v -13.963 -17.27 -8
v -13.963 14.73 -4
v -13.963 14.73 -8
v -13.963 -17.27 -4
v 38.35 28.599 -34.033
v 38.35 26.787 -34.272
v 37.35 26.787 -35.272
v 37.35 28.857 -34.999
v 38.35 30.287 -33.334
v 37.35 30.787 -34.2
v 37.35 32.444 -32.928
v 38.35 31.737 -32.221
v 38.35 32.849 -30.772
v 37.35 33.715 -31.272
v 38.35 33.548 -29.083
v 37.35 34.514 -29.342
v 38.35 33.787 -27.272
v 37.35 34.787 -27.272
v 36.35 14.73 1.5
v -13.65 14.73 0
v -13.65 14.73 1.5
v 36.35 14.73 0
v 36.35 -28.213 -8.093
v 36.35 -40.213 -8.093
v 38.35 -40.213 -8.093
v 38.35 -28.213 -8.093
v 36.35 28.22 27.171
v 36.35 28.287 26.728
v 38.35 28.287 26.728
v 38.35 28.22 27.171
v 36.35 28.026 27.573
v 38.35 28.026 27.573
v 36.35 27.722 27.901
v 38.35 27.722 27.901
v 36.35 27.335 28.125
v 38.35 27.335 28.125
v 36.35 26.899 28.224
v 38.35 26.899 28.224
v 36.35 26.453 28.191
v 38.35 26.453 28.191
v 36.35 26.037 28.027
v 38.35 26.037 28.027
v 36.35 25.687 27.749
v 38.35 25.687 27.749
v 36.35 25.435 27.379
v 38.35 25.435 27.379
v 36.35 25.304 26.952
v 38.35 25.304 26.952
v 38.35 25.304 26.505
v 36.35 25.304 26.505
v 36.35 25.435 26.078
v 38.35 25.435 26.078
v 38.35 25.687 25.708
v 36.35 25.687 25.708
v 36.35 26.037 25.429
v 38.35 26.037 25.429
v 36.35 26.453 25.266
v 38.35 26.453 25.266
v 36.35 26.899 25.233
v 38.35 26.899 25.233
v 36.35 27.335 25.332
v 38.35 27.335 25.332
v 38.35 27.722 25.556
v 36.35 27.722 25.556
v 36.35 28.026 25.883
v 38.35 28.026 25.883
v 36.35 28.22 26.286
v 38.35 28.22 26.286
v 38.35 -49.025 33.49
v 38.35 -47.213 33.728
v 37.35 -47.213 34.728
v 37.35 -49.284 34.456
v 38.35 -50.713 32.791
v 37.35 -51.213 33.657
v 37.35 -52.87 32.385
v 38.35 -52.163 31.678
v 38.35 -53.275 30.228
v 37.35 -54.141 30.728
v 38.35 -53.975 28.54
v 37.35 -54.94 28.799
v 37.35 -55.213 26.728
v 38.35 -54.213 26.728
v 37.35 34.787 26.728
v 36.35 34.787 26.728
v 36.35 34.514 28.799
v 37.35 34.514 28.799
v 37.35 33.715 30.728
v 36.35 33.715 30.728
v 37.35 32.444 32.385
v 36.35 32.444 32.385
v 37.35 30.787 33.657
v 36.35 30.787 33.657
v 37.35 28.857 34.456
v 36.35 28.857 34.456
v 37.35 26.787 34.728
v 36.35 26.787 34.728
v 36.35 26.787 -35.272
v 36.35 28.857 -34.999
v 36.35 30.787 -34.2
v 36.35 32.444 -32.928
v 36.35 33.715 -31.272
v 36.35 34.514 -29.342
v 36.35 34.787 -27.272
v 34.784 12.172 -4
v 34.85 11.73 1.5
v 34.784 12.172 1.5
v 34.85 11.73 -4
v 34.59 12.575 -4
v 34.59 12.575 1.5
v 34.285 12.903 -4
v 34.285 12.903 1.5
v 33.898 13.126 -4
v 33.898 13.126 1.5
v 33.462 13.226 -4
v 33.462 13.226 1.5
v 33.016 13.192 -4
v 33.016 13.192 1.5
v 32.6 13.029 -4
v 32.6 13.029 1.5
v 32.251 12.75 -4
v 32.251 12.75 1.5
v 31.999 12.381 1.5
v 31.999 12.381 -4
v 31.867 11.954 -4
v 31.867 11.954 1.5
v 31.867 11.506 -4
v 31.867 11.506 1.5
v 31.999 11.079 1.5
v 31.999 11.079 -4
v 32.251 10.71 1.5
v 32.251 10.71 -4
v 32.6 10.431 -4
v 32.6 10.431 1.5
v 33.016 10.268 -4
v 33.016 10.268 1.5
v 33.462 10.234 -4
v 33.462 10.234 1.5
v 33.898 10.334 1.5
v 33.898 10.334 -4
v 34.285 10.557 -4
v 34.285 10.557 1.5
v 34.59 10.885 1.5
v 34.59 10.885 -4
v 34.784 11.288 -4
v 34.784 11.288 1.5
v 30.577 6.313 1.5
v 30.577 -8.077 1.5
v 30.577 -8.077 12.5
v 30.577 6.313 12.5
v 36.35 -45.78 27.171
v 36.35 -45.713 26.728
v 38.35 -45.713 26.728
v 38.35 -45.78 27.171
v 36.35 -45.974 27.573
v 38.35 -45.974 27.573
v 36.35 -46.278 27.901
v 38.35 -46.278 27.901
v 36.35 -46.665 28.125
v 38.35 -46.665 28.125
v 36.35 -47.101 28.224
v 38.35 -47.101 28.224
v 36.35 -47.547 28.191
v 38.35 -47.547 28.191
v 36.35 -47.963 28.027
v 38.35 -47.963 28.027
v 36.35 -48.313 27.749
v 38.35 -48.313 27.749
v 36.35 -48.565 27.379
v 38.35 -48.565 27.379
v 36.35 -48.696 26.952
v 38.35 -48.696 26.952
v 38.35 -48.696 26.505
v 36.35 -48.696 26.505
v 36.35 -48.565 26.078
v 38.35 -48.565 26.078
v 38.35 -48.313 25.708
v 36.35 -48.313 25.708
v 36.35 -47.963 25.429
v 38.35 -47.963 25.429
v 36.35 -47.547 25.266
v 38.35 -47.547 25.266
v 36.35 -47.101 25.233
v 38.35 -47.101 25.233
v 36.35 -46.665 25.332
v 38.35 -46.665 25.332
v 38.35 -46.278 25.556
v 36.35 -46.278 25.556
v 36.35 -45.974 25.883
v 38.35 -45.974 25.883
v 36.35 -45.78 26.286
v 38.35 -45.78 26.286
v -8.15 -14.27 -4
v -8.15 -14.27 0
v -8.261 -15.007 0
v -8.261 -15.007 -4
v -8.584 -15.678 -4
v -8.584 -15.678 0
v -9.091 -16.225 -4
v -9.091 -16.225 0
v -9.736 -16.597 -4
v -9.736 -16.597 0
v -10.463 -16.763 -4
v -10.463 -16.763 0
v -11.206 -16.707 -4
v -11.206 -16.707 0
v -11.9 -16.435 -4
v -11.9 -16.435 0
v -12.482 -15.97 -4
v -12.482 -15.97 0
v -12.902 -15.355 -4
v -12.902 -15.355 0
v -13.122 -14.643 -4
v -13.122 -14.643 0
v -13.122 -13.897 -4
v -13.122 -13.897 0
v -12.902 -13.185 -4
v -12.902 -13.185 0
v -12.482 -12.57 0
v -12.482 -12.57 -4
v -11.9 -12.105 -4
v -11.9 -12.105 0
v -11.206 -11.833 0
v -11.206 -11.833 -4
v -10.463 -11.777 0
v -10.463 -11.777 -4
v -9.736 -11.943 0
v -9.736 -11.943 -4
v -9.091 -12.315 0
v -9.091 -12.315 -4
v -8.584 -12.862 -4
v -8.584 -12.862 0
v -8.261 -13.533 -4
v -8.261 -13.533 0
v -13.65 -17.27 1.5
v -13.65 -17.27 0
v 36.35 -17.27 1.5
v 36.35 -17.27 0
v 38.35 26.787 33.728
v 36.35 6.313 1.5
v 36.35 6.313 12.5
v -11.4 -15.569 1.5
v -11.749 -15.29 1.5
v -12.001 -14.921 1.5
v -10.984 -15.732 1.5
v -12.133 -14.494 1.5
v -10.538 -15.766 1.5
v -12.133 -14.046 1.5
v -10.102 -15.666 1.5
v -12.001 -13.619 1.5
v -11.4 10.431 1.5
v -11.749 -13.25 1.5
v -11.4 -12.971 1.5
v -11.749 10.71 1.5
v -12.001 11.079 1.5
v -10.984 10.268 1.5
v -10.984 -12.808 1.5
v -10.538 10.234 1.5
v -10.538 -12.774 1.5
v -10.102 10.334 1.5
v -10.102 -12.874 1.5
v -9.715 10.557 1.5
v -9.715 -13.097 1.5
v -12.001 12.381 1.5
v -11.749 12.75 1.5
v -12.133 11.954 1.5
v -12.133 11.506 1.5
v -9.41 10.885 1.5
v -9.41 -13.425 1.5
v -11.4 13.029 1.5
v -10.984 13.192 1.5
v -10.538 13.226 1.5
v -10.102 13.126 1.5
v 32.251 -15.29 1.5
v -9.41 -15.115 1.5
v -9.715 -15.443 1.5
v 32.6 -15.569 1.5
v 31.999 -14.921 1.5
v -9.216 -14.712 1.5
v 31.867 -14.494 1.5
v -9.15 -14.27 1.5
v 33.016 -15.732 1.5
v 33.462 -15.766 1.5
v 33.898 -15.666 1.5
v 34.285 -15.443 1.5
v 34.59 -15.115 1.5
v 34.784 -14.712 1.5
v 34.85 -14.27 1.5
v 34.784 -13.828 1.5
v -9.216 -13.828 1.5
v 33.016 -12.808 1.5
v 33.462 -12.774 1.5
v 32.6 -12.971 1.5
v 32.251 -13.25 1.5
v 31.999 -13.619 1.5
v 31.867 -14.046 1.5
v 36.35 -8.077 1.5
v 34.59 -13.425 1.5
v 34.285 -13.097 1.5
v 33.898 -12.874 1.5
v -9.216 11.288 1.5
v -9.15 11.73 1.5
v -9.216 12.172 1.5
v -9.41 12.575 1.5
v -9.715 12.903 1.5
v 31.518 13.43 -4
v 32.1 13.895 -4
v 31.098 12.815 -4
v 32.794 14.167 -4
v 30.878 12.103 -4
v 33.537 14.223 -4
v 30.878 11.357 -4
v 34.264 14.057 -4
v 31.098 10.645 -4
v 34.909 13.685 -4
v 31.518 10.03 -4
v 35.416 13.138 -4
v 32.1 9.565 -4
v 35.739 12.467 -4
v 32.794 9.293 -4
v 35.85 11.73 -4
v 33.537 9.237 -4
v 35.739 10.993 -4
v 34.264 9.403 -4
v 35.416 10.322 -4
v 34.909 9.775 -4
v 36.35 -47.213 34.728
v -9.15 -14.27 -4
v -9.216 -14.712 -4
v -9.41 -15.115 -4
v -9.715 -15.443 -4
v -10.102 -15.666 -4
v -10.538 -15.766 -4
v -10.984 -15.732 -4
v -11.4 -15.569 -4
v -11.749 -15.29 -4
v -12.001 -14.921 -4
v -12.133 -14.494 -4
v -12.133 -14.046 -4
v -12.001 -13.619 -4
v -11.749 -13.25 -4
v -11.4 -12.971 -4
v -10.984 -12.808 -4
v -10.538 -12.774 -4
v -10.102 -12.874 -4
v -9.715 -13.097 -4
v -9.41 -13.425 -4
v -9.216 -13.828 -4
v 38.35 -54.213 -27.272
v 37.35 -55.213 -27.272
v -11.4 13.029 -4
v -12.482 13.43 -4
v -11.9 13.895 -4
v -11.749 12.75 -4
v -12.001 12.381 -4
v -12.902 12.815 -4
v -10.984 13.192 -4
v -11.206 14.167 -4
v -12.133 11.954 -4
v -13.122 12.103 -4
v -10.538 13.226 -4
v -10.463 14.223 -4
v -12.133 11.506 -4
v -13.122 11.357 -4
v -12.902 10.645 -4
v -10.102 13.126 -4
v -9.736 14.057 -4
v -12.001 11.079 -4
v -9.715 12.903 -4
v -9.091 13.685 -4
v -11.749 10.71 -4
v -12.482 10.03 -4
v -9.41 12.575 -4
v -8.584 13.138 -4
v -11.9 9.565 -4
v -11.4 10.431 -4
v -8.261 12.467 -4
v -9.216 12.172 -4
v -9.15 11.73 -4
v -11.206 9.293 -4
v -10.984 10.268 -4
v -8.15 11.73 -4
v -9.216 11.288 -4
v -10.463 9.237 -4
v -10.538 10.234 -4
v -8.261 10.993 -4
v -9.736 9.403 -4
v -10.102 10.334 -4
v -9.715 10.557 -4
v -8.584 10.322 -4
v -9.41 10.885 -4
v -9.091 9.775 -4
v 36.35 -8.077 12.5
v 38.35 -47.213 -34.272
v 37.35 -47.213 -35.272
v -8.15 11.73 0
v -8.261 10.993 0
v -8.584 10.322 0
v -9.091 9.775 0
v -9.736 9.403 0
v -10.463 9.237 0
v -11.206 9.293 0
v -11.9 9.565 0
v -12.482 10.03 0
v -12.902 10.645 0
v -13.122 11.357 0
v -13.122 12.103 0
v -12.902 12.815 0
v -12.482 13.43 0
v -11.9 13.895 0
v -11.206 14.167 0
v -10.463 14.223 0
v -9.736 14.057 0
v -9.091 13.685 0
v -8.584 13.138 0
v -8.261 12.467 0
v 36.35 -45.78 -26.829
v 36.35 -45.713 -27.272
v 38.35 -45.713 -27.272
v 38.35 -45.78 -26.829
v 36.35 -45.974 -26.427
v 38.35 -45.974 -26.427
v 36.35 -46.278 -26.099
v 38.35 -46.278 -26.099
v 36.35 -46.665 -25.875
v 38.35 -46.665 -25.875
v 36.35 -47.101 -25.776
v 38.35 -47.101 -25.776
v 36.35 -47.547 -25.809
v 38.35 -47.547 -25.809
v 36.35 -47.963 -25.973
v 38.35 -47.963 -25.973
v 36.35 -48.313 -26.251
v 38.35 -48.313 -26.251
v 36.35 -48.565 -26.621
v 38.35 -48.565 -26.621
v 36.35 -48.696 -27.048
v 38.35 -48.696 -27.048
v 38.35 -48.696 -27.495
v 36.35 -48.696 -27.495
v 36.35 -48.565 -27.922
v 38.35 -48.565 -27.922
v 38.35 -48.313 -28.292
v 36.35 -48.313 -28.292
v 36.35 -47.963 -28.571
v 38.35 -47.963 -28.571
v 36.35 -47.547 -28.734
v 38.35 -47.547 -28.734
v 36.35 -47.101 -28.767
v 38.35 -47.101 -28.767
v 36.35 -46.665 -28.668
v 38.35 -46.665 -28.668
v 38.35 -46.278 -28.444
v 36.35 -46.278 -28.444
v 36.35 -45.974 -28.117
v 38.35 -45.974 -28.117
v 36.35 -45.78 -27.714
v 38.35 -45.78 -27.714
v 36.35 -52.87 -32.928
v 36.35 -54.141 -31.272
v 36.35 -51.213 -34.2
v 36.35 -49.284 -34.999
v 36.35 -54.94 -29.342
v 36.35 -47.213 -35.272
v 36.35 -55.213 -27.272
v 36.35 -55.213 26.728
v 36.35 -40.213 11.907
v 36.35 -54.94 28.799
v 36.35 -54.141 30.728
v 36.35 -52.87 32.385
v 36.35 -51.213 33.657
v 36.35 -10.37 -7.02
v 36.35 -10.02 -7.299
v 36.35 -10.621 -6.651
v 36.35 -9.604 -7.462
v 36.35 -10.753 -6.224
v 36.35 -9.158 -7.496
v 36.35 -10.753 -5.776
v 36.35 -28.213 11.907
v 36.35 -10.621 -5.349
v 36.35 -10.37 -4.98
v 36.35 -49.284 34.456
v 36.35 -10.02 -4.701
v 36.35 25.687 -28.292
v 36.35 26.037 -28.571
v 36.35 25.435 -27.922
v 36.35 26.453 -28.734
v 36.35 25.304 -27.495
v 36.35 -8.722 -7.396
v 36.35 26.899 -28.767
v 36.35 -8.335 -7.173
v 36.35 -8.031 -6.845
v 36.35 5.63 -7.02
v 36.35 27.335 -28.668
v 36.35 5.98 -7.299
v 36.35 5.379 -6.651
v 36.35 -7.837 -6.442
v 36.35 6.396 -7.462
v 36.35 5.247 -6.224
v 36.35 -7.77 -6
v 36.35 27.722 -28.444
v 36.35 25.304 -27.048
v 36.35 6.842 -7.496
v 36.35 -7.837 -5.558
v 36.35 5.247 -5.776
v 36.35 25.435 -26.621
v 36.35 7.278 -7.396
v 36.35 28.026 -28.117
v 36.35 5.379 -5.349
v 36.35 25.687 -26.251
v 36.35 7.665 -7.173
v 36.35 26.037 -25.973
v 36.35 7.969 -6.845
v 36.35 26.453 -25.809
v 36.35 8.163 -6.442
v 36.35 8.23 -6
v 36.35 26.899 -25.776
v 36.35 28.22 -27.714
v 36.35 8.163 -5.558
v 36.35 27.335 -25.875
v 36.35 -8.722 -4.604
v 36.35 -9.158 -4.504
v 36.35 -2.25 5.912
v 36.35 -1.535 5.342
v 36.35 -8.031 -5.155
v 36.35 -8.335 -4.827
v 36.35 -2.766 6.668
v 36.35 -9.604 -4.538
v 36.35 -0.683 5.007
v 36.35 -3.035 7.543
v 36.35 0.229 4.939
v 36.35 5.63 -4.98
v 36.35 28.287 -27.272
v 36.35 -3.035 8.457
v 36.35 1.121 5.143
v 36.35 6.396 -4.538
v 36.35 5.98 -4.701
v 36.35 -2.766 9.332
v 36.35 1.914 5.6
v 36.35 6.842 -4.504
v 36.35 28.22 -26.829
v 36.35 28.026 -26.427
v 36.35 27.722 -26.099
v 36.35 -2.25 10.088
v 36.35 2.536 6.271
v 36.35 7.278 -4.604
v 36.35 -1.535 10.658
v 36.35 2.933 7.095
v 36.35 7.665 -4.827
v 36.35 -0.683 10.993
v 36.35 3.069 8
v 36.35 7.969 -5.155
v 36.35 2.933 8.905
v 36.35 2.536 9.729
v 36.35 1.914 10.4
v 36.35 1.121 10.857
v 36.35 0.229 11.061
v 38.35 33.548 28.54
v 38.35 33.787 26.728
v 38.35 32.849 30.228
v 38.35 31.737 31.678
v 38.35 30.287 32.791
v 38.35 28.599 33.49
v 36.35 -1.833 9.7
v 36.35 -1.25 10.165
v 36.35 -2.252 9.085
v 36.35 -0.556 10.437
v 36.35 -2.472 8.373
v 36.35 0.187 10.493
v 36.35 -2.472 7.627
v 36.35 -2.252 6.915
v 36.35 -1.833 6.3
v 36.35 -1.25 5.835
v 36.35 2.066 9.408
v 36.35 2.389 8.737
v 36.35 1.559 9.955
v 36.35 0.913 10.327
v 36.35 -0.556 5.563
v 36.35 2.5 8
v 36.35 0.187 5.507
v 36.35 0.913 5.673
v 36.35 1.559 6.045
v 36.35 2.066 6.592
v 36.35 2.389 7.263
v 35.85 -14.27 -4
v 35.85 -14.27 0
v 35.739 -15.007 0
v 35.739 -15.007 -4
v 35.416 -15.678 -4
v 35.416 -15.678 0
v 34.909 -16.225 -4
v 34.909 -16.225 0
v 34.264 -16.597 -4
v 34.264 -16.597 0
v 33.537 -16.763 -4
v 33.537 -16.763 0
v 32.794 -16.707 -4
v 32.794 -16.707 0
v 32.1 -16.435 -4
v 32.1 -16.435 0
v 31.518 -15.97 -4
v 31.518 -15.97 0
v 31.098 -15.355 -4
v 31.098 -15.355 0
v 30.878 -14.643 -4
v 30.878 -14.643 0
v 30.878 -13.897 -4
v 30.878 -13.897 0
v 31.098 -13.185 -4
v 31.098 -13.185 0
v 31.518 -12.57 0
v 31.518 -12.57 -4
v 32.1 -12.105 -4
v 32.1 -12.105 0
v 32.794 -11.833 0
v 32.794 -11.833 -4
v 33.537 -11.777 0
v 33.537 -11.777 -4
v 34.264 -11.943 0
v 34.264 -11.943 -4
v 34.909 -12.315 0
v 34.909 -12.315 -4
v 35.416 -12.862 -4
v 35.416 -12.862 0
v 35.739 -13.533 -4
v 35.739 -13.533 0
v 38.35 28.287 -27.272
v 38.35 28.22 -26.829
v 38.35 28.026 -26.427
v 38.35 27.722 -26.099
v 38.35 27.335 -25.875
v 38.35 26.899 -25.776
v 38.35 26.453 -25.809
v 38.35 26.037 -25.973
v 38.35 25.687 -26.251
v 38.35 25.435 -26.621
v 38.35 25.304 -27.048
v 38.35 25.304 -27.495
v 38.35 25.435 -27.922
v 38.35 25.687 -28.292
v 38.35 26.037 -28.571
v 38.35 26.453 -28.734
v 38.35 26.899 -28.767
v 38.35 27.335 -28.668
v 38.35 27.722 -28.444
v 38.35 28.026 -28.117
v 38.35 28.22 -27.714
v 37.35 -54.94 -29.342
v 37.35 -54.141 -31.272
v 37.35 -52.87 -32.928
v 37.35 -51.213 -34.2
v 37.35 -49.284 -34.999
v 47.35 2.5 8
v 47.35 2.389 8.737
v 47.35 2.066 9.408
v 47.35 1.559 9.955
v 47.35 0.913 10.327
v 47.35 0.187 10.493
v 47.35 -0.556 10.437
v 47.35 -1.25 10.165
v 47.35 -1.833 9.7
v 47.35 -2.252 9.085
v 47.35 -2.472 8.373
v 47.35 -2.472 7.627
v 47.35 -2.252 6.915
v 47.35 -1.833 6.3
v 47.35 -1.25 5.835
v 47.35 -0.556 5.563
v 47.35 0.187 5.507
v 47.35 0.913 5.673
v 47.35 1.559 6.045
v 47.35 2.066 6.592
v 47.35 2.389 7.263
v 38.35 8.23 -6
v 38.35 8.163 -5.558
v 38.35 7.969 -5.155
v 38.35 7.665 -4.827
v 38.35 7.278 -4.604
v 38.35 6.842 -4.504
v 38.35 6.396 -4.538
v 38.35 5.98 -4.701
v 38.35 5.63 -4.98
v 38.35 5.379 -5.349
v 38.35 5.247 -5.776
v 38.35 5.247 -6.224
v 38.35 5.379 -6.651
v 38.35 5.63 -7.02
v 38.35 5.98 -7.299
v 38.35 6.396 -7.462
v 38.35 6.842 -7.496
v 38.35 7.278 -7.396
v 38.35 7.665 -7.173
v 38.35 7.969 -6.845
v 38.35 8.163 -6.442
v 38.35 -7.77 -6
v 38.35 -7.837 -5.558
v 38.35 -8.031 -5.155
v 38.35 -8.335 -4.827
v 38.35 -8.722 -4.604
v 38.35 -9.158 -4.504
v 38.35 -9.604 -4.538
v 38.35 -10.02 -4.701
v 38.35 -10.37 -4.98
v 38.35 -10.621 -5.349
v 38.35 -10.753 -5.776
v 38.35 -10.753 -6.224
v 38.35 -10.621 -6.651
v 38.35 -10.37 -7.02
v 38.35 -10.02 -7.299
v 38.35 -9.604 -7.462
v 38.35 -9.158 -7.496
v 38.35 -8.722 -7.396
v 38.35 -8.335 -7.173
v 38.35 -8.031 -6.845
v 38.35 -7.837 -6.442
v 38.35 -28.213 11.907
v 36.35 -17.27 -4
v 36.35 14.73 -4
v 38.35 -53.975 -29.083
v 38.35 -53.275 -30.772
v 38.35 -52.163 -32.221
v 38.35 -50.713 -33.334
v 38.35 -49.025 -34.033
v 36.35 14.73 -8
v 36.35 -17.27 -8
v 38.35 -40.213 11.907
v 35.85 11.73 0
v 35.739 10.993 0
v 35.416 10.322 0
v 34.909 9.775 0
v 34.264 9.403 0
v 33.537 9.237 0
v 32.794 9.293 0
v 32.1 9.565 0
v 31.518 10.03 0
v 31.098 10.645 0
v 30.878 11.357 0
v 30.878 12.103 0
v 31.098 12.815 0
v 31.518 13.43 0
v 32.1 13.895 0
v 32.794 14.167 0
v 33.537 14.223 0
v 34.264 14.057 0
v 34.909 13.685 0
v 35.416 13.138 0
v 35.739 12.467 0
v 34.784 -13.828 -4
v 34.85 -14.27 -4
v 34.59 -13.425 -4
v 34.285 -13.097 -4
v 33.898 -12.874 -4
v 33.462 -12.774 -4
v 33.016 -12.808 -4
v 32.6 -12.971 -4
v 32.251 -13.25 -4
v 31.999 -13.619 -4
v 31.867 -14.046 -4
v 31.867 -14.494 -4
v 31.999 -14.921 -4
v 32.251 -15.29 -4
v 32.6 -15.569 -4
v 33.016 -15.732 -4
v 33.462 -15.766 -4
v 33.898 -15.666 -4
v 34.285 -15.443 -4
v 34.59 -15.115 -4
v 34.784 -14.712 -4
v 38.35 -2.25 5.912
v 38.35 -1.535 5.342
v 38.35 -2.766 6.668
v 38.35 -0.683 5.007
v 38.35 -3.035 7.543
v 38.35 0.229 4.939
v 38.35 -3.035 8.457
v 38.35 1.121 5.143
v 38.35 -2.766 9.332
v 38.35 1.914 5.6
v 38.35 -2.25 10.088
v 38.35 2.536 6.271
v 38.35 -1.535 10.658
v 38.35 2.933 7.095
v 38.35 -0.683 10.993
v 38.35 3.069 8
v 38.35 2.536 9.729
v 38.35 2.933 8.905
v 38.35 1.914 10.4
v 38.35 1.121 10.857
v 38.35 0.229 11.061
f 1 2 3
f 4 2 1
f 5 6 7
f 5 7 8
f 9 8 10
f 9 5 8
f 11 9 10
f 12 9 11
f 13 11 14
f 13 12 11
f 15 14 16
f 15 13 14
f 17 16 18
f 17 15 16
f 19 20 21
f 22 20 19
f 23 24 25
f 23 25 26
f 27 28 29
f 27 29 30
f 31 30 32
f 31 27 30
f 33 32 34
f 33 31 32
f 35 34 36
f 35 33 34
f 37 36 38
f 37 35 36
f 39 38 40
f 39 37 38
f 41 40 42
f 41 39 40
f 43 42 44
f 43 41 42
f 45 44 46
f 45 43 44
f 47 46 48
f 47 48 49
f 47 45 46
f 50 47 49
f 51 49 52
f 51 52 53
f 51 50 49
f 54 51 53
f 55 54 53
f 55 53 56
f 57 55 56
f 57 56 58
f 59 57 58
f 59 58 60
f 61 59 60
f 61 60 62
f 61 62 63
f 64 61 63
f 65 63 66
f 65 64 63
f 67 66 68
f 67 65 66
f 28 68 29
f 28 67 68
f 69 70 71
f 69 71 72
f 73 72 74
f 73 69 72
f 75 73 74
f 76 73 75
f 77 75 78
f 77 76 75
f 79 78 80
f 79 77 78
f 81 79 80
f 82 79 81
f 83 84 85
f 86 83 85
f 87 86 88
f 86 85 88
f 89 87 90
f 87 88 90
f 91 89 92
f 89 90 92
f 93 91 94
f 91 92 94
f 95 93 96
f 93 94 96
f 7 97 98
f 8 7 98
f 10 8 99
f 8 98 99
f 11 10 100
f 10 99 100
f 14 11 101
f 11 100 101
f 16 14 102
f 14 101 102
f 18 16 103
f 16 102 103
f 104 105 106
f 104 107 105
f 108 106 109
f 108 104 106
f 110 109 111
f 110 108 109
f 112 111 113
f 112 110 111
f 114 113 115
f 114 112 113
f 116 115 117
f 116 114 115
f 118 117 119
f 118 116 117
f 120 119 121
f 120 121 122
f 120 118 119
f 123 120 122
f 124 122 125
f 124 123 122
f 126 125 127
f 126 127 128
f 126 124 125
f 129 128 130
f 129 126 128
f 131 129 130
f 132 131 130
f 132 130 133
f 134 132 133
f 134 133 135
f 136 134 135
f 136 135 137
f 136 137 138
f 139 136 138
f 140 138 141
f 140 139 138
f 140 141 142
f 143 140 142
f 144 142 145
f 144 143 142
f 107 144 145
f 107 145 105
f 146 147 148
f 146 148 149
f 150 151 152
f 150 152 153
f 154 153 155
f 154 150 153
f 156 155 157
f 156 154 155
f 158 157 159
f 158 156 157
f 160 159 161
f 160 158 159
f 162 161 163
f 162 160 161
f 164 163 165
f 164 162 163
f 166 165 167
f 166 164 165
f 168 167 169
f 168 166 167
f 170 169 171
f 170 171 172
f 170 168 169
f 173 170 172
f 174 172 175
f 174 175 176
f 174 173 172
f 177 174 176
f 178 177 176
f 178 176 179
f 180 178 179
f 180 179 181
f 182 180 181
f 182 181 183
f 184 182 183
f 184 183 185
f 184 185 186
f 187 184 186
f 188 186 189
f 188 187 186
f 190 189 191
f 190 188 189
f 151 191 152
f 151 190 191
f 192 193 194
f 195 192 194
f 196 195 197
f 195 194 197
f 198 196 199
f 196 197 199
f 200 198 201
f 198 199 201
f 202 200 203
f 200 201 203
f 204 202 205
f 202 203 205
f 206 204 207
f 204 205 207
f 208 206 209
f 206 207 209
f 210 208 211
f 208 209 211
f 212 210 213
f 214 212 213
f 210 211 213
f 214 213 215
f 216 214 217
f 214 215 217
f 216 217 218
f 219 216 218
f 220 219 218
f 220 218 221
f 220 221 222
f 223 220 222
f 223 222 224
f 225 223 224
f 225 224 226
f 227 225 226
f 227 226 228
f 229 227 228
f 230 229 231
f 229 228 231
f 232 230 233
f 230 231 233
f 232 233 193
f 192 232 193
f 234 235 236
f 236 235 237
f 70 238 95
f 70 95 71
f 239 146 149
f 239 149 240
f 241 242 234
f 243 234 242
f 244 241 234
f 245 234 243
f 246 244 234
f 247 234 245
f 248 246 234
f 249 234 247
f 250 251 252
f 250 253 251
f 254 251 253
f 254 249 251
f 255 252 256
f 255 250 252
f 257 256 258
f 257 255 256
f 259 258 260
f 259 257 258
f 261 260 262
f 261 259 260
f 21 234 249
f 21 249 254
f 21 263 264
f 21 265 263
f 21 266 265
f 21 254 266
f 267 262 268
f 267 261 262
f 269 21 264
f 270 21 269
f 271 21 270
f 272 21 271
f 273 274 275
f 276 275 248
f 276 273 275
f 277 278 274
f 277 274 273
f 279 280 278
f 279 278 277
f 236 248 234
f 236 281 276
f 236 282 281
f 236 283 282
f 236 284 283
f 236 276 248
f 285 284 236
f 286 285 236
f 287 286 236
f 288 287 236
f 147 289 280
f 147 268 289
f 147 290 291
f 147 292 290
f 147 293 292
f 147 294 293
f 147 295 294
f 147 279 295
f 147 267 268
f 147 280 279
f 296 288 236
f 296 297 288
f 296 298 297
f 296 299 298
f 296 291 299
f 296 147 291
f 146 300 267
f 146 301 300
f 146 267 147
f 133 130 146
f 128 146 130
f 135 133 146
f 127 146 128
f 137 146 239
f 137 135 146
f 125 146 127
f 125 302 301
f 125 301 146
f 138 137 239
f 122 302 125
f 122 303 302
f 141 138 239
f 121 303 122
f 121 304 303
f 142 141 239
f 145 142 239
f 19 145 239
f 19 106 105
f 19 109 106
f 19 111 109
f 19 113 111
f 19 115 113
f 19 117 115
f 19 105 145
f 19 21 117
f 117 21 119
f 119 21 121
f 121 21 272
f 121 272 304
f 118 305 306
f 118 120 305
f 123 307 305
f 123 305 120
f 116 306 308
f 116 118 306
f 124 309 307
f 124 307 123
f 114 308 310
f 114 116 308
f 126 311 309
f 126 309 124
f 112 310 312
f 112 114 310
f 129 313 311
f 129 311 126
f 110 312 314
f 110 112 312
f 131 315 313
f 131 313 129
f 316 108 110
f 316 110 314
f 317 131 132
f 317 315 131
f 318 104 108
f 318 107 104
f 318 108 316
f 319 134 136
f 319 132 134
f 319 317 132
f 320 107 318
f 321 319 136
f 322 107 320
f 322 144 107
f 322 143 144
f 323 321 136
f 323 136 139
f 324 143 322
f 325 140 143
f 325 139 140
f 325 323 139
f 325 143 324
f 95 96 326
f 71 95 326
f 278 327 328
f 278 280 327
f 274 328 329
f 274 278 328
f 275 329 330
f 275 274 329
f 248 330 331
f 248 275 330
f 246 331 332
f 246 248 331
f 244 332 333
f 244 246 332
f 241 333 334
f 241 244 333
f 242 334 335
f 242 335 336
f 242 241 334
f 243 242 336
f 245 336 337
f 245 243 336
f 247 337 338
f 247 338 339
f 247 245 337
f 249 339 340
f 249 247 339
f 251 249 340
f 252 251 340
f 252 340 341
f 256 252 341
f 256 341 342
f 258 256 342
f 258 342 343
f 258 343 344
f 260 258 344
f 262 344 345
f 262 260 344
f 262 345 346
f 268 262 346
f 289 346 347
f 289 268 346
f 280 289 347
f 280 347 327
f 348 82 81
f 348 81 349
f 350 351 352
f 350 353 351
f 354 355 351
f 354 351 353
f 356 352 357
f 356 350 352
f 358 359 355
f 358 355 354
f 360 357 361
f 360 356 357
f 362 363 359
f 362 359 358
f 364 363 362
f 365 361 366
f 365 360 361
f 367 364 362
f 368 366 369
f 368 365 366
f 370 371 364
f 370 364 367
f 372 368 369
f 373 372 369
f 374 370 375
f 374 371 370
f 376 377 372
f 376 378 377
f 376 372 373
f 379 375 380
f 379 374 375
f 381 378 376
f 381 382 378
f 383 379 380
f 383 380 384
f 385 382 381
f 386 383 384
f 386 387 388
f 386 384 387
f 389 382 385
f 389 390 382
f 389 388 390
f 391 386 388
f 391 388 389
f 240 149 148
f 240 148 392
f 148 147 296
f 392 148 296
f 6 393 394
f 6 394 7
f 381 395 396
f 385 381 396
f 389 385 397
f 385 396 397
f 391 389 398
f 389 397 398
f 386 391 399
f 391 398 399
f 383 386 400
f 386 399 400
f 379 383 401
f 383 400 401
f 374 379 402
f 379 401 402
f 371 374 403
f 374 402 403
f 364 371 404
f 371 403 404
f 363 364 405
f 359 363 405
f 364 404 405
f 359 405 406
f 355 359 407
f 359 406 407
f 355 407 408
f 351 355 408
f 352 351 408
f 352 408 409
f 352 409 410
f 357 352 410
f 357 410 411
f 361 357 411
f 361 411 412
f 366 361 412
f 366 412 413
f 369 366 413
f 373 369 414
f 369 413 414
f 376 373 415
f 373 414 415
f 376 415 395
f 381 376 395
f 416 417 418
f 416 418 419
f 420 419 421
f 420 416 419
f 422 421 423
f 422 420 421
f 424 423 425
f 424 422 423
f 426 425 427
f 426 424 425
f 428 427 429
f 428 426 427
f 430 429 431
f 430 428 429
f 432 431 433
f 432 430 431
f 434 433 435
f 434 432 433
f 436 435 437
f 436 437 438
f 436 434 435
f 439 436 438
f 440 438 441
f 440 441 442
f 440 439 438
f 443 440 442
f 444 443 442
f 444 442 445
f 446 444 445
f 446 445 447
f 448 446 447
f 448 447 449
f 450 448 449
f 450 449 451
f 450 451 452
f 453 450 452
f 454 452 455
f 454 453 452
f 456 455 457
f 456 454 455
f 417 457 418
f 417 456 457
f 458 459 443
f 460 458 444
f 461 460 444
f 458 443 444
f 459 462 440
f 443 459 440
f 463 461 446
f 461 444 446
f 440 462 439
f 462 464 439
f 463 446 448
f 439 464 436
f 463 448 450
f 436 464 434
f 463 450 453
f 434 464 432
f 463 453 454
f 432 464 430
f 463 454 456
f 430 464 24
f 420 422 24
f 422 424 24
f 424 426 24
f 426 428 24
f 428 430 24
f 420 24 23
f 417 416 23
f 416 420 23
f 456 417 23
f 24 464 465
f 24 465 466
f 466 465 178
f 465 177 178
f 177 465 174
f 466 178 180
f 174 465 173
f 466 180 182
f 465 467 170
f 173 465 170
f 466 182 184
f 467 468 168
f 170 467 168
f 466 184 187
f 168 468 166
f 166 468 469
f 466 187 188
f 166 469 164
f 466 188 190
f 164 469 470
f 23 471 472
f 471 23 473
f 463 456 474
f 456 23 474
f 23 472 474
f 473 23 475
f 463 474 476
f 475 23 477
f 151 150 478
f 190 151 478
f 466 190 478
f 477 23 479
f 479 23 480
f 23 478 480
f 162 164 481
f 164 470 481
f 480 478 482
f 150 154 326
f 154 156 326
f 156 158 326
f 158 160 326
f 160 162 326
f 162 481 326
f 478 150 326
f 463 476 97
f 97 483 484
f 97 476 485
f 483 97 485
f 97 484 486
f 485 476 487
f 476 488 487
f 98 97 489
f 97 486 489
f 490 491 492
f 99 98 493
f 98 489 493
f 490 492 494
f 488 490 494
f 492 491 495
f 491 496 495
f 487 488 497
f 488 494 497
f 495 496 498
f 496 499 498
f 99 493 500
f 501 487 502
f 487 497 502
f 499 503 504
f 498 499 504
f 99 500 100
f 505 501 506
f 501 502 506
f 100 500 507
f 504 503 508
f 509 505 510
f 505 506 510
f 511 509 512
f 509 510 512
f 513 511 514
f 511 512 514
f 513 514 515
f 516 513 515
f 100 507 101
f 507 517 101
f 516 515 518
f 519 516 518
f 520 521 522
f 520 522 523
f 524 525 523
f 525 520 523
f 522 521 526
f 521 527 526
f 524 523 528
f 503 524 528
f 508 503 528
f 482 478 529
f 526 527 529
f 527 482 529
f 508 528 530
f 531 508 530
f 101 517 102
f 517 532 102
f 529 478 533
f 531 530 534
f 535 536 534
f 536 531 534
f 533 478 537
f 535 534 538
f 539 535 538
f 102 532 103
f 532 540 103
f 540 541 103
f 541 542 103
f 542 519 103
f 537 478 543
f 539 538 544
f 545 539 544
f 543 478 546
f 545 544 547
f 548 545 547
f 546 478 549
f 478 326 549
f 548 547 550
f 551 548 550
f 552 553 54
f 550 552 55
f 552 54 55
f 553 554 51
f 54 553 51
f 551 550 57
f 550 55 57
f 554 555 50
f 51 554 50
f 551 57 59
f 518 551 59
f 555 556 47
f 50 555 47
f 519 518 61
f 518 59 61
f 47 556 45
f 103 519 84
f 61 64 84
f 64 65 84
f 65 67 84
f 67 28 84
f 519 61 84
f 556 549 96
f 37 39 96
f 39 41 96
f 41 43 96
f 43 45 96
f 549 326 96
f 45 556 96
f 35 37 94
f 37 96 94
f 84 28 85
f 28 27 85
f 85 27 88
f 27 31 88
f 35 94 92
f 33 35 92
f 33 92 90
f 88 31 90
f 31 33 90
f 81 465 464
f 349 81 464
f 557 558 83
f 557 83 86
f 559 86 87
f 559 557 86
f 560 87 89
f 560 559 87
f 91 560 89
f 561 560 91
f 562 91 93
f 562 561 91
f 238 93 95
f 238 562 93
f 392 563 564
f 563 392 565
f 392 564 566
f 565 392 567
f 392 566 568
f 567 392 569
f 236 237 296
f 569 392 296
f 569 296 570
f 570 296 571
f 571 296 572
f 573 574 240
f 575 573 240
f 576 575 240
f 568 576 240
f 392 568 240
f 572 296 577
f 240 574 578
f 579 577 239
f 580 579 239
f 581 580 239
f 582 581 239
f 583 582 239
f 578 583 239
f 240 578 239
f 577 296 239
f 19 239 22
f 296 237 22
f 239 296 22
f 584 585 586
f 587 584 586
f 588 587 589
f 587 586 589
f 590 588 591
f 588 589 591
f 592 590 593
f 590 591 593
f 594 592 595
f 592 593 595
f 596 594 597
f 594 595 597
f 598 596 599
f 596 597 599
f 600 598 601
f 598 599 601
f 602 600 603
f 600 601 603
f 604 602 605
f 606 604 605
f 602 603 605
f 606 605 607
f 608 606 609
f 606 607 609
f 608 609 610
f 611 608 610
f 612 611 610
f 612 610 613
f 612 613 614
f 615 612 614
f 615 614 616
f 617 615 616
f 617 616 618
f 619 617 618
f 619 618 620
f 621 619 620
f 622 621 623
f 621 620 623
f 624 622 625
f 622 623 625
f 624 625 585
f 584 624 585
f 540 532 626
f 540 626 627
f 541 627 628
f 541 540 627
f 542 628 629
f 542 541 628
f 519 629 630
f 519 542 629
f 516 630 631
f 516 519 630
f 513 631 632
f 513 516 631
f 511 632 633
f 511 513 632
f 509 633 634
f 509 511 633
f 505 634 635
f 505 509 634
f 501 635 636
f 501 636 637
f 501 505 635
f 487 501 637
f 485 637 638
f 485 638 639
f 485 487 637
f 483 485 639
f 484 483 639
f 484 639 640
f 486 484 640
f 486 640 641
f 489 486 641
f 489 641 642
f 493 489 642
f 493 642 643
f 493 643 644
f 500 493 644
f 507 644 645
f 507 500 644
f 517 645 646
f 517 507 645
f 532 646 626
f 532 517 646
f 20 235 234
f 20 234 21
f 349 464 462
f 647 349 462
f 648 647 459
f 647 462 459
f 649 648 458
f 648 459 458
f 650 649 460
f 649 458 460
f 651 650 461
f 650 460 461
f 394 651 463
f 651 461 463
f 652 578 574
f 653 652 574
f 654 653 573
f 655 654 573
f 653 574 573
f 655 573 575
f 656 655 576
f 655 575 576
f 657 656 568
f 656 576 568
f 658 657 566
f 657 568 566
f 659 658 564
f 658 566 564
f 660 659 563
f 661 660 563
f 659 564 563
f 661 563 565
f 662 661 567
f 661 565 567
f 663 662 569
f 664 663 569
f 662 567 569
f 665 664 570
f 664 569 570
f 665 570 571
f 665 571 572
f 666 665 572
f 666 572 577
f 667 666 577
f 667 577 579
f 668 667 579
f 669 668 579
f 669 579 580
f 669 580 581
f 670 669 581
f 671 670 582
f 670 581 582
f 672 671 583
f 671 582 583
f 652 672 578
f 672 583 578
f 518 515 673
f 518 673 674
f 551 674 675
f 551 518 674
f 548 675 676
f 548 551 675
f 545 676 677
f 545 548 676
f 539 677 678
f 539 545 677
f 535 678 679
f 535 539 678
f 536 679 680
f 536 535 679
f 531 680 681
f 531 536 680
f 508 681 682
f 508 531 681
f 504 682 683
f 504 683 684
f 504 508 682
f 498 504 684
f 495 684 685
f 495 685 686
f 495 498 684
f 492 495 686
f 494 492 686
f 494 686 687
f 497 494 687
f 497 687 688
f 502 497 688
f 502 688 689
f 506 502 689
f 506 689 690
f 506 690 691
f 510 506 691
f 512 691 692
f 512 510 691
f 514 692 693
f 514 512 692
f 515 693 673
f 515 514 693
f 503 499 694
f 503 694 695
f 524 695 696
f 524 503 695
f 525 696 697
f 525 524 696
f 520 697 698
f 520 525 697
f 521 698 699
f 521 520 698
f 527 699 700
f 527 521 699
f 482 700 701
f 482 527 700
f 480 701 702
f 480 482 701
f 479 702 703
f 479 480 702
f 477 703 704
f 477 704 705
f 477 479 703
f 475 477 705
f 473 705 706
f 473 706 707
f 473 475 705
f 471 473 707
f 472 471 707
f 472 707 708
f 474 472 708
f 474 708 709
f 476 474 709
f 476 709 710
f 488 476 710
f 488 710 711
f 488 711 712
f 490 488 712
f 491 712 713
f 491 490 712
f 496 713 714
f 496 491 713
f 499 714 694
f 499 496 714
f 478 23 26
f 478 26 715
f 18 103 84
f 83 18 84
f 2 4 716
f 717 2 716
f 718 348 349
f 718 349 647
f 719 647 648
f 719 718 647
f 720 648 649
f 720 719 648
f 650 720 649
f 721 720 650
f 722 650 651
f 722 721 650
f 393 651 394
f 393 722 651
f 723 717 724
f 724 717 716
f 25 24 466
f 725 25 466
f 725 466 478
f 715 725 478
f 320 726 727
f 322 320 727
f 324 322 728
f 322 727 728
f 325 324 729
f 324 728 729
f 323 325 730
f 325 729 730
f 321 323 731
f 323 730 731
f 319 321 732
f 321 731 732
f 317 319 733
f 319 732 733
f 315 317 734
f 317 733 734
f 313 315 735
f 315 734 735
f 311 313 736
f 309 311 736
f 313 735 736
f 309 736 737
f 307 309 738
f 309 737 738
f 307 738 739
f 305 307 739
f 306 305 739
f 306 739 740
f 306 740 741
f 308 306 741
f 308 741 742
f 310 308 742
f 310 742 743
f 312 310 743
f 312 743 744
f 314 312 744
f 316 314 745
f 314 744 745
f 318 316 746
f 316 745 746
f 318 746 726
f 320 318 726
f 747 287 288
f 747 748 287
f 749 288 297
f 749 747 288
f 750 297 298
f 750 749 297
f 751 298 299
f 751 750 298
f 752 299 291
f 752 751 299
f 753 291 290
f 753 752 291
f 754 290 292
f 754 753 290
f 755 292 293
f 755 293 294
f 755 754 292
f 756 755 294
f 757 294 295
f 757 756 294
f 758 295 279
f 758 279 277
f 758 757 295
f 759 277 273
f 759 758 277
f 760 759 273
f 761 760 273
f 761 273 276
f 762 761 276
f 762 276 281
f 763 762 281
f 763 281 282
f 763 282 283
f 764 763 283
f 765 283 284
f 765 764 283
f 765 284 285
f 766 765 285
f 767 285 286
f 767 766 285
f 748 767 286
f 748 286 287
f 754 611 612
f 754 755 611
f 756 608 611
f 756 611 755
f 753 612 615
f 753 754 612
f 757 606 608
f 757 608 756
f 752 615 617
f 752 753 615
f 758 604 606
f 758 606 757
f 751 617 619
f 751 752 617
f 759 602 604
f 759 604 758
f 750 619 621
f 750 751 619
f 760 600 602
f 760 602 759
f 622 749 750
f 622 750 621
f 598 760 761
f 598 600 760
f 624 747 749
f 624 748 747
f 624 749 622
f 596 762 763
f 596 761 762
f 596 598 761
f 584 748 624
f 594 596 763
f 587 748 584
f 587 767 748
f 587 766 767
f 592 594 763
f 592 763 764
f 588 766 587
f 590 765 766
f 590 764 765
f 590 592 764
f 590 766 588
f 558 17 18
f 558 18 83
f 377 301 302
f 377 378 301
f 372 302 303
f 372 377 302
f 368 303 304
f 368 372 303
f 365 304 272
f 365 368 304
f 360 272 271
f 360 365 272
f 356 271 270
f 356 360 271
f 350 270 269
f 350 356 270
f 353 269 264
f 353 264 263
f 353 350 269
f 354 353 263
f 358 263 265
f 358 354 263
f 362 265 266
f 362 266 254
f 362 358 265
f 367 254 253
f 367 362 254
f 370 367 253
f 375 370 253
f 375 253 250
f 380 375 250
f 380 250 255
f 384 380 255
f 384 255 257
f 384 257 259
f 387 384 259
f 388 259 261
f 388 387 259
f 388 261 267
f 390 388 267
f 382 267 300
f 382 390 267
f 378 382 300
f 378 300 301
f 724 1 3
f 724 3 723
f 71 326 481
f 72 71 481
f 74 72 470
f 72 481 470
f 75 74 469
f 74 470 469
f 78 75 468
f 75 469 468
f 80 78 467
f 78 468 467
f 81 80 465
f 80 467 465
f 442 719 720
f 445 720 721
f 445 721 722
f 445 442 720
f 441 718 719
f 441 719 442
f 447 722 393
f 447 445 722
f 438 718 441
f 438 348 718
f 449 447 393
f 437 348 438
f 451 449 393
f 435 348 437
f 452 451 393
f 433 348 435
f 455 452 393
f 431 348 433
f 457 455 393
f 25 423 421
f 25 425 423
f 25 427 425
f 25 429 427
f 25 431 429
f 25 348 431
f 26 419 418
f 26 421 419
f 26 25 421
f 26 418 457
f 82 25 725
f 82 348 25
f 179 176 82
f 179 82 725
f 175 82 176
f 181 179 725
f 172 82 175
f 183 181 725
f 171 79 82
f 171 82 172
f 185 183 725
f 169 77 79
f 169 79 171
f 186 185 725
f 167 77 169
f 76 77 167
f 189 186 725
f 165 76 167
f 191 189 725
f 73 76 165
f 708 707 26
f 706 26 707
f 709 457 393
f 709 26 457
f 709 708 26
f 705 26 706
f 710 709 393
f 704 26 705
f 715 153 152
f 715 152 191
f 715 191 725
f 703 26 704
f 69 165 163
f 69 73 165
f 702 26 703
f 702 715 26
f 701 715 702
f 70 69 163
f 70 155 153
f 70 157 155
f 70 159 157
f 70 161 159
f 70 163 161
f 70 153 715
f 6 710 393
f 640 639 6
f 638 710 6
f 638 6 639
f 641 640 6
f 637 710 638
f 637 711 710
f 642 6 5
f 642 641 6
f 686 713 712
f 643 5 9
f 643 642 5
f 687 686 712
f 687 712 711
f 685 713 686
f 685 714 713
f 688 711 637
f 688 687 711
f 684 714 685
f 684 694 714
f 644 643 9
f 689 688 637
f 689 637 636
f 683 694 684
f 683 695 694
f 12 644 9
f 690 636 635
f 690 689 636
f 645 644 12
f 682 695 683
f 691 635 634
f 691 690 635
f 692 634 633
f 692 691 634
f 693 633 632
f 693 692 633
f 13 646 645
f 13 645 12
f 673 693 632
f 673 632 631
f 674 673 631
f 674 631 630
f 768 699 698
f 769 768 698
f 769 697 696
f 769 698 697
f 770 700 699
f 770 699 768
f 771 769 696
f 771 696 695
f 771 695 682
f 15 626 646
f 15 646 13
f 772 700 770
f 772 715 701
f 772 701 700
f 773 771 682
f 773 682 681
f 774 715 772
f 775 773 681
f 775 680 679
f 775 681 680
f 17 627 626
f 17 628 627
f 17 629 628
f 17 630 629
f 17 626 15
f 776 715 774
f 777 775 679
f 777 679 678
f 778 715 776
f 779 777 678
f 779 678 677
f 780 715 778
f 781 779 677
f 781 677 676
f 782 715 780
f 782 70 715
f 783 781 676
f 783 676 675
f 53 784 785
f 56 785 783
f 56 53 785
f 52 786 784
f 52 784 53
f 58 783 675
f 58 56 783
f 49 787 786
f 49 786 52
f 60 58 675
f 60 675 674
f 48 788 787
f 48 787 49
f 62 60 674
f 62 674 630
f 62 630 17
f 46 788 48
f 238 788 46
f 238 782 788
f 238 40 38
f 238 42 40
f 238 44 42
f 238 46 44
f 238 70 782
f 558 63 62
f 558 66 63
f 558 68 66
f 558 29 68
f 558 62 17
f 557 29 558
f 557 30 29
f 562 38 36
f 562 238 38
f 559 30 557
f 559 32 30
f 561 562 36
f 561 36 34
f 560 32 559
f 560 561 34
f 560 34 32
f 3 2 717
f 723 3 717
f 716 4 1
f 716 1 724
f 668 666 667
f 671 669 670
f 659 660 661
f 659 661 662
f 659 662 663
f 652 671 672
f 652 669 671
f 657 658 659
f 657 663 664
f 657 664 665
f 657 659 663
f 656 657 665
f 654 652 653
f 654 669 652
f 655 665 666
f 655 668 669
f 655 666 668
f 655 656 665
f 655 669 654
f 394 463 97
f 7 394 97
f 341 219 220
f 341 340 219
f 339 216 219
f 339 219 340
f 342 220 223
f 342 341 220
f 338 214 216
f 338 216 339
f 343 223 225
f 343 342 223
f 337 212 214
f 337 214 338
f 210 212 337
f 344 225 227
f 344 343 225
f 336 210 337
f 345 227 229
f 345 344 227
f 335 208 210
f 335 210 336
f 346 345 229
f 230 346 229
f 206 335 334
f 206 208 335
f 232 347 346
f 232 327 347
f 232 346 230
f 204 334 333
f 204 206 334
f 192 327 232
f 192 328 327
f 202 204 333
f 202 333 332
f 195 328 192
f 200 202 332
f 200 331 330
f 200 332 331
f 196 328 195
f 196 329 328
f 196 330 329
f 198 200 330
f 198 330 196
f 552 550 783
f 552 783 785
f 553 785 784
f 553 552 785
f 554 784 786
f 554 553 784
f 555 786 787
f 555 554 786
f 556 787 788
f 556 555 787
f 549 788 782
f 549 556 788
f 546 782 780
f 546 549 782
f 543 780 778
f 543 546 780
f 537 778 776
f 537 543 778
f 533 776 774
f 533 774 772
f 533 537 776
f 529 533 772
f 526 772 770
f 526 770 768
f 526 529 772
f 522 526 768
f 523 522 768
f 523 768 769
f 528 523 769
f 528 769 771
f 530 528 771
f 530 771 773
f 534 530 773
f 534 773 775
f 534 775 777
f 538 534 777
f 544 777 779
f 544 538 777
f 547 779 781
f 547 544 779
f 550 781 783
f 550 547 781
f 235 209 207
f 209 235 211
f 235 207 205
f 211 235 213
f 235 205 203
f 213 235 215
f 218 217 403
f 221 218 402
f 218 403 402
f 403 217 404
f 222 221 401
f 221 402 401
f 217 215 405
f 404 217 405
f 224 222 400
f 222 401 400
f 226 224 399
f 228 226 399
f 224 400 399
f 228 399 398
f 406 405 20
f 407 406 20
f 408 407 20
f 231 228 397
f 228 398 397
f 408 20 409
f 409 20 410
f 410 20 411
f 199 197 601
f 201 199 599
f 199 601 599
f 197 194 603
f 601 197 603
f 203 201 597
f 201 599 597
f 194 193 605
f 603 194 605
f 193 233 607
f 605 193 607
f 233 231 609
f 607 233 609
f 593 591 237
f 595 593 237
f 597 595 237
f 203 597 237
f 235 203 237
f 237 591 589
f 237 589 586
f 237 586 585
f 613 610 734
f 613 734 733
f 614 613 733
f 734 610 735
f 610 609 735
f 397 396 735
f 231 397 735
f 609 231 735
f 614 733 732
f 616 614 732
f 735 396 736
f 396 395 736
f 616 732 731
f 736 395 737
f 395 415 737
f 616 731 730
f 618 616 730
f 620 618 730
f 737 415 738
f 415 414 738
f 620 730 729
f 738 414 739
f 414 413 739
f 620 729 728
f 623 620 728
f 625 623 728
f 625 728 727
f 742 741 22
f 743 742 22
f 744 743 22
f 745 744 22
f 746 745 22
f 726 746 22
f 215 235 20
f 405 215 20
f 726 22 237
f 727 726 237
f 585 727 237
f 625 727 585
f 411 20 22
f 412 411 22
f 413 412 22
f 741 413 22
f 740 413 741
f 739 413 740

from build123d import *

# Parameters (mm, degrees)
F0_W      = 50
F0_H      = 32
F0_R      = 1.5
F1_DEPTH  = 1.5
F2_W      = 5.773286
F2_H      = 14.389993
F3_DEPTH  = 11
F4_R      = 2.5
F5_DEPTH  = 11
F6_R      = 2.5
F6_R_2    = 1.5
F7_DEPTH  = 4
F8_W      = 50.313371
F8_H      = 32
F9_DEPTH  = 4
F10_R     = 1.5
F10_W     = 12
F10_H     = 20
F10_R_2   = 3.069476
F11_DEPTH = 2
F12_SIZE  = 1


with BuildPart() as f1:
    # F0 (on Top) → F1 (new body)
    with BuildSketch(Plane.XY):
        with Locations((11.350212, -1.27)):
            Rectangle(F0_W, F0_H)
        with Locations((-10.649788, -14.27)):
            Circle(F0_R, mode=Mode.SUBTRACT)
        with Locations((33.350212, -14.27)):
            Circle(F0_R, mode=Mode.SUBTRACT)
        with Locations((-10.649788, 11.73)):
            Circle(F0_R, mode=Mode.SUBTRACT)
        with Locations((33.350212, 11.73)):
            Circle(F0_R, mode=Mode.SUBTRACT)
    extrude(amount=F1_DEPTH)

    # F2 (on face) → F3 (join)
    with BuildSketch(Plane.XY.offset(1.5)):
        with Locations((33.463569, -0.881928)):
            Rectangle(F2_W, F2_H)
    extrude(amount=F3_DEPTH)

    # F4 (on face) → F5 (join)
    with BuildSketch(Plane.YZ.offset(36.350212)):
        with Locations((0, 8)):
            Circle(F4_R)
    extrude(amount=F5_DEPTH)

    # F6 (on face) → F7 (join)
    with BuildSketch(Plane(origin=(0, 0, 0), x_dir=(1, 0, 0), z_dir=(0, 0, -1))):
        with Locations((-10.649788, 14.27)):
            Circle(F6_R)
        with Locations((-10.649788, 14.27)):
            Circle(F6_R_2, mode=Mode.SUBTRACT)
        with Locations((-10.649788, -11.73)):
            Circle(F6_R)
        with Locations((-10.649788, -11.73)):
            Circle(F6_R_2, mode=Mode.SUBTRACT)
        with Locations((33.350212, -11.73)):
            Circle(F6_R)
        with Locations((33.350212, -11.73)):
            Circle(F6_R_2, mode=Mode.SUBTRACT)
        with Locations((33.350212, 14.27)):
            Circle(F6_R)
        with Locations((33.350212, 14.27)):
            Circle(F6_R_2, mode=Mode.SUBTRACT)
    extrude(amount=F7_DEPTH)


with BuildPart() as f9:
    # F8 (on face) → F9 (new body)
    with BuildSketch(Plane(origin=(0, 0, -4), x_dir=(1, 0, 0), z_dir=(0, 0, -1))):
        with Locations((11.193527, 1.27)):
            Rectangle(F8_W, F8_H)
    extrude(amount=F9_DEPTH)


with BuildPart() as f11:
    # F10 (on face) → F11 (new body)
    with BuildSketch(Plane.YZ.offset(36.350212)):
        with BuildLine():
            Line((26.786909, 34.72837), (-47.213091, 34.72837))
            ThreePointArc((-47.213091, 34.72837), (-52.869946, 32.385225), (-55.213091, 26.72837))
            Line((-55.213091, 26.72837), (-55.213091, -27.27163))
            ThreePointArc((-55.213091, -27.27163), (-52.869946, -32.928484), (-47.213091, -35.27163))
            Line((-47.213091, -35.27163), (26.786909, -35.27163))
            ThreePointArc((26.786909, -35.27163), (32.443763, -32.928484), (34.786909, -27.27163))
            Line((34.786909, -27.27163), (34.786909, 26.72837))
            ThreePointArc((34.786909, 26.72837), (32.443763, 32.385225), (26.786909, 34.72837))
        make_face()
        with Locations((-47.213091, -27.27163)):
            Circle(F10_R, mode=Mode.SUBTRACT)
        with Locations((26.786909, -27.27163)):
            Circle(F10_R, mode=Mode.SUBTRACT)
        with Locations((-9.27, -6)):
            Circle(F10_R, mode=Mode.SUBTRACT)
        with Locations((6.73, -6)):
            Circle(F10_R, mode=Mode.SUBTRACT)
        with Locations((-34.213091, 1.907497)):
            Rectangle(F10_W, F10_H, mode=Mode.SUBTRACT)
        with Locations((-47.213091, 26.72837)):
            Circle(F10_R, mode=Mode.SUBTRACT)
        with Locations((0, 8)):
            Circle(F10_R_2, mode=Mode.SUBTRACT)
        with Locations((26.786909, 26.72837)):
            Circle(F10_R, mode=Mode.SUBTRACT)
    extrude(amount=F11_DEPTH)

    # F12
    f12_edges = [f11.edges().sort_by_distance(p)[0] for p in [
        (38.350212, -55.213091, -0.27163),
    ]]
    chamfer(f12_edges, length=F12_SIZE)


solid = Compound([f1.part, f9.part, f11.part])
